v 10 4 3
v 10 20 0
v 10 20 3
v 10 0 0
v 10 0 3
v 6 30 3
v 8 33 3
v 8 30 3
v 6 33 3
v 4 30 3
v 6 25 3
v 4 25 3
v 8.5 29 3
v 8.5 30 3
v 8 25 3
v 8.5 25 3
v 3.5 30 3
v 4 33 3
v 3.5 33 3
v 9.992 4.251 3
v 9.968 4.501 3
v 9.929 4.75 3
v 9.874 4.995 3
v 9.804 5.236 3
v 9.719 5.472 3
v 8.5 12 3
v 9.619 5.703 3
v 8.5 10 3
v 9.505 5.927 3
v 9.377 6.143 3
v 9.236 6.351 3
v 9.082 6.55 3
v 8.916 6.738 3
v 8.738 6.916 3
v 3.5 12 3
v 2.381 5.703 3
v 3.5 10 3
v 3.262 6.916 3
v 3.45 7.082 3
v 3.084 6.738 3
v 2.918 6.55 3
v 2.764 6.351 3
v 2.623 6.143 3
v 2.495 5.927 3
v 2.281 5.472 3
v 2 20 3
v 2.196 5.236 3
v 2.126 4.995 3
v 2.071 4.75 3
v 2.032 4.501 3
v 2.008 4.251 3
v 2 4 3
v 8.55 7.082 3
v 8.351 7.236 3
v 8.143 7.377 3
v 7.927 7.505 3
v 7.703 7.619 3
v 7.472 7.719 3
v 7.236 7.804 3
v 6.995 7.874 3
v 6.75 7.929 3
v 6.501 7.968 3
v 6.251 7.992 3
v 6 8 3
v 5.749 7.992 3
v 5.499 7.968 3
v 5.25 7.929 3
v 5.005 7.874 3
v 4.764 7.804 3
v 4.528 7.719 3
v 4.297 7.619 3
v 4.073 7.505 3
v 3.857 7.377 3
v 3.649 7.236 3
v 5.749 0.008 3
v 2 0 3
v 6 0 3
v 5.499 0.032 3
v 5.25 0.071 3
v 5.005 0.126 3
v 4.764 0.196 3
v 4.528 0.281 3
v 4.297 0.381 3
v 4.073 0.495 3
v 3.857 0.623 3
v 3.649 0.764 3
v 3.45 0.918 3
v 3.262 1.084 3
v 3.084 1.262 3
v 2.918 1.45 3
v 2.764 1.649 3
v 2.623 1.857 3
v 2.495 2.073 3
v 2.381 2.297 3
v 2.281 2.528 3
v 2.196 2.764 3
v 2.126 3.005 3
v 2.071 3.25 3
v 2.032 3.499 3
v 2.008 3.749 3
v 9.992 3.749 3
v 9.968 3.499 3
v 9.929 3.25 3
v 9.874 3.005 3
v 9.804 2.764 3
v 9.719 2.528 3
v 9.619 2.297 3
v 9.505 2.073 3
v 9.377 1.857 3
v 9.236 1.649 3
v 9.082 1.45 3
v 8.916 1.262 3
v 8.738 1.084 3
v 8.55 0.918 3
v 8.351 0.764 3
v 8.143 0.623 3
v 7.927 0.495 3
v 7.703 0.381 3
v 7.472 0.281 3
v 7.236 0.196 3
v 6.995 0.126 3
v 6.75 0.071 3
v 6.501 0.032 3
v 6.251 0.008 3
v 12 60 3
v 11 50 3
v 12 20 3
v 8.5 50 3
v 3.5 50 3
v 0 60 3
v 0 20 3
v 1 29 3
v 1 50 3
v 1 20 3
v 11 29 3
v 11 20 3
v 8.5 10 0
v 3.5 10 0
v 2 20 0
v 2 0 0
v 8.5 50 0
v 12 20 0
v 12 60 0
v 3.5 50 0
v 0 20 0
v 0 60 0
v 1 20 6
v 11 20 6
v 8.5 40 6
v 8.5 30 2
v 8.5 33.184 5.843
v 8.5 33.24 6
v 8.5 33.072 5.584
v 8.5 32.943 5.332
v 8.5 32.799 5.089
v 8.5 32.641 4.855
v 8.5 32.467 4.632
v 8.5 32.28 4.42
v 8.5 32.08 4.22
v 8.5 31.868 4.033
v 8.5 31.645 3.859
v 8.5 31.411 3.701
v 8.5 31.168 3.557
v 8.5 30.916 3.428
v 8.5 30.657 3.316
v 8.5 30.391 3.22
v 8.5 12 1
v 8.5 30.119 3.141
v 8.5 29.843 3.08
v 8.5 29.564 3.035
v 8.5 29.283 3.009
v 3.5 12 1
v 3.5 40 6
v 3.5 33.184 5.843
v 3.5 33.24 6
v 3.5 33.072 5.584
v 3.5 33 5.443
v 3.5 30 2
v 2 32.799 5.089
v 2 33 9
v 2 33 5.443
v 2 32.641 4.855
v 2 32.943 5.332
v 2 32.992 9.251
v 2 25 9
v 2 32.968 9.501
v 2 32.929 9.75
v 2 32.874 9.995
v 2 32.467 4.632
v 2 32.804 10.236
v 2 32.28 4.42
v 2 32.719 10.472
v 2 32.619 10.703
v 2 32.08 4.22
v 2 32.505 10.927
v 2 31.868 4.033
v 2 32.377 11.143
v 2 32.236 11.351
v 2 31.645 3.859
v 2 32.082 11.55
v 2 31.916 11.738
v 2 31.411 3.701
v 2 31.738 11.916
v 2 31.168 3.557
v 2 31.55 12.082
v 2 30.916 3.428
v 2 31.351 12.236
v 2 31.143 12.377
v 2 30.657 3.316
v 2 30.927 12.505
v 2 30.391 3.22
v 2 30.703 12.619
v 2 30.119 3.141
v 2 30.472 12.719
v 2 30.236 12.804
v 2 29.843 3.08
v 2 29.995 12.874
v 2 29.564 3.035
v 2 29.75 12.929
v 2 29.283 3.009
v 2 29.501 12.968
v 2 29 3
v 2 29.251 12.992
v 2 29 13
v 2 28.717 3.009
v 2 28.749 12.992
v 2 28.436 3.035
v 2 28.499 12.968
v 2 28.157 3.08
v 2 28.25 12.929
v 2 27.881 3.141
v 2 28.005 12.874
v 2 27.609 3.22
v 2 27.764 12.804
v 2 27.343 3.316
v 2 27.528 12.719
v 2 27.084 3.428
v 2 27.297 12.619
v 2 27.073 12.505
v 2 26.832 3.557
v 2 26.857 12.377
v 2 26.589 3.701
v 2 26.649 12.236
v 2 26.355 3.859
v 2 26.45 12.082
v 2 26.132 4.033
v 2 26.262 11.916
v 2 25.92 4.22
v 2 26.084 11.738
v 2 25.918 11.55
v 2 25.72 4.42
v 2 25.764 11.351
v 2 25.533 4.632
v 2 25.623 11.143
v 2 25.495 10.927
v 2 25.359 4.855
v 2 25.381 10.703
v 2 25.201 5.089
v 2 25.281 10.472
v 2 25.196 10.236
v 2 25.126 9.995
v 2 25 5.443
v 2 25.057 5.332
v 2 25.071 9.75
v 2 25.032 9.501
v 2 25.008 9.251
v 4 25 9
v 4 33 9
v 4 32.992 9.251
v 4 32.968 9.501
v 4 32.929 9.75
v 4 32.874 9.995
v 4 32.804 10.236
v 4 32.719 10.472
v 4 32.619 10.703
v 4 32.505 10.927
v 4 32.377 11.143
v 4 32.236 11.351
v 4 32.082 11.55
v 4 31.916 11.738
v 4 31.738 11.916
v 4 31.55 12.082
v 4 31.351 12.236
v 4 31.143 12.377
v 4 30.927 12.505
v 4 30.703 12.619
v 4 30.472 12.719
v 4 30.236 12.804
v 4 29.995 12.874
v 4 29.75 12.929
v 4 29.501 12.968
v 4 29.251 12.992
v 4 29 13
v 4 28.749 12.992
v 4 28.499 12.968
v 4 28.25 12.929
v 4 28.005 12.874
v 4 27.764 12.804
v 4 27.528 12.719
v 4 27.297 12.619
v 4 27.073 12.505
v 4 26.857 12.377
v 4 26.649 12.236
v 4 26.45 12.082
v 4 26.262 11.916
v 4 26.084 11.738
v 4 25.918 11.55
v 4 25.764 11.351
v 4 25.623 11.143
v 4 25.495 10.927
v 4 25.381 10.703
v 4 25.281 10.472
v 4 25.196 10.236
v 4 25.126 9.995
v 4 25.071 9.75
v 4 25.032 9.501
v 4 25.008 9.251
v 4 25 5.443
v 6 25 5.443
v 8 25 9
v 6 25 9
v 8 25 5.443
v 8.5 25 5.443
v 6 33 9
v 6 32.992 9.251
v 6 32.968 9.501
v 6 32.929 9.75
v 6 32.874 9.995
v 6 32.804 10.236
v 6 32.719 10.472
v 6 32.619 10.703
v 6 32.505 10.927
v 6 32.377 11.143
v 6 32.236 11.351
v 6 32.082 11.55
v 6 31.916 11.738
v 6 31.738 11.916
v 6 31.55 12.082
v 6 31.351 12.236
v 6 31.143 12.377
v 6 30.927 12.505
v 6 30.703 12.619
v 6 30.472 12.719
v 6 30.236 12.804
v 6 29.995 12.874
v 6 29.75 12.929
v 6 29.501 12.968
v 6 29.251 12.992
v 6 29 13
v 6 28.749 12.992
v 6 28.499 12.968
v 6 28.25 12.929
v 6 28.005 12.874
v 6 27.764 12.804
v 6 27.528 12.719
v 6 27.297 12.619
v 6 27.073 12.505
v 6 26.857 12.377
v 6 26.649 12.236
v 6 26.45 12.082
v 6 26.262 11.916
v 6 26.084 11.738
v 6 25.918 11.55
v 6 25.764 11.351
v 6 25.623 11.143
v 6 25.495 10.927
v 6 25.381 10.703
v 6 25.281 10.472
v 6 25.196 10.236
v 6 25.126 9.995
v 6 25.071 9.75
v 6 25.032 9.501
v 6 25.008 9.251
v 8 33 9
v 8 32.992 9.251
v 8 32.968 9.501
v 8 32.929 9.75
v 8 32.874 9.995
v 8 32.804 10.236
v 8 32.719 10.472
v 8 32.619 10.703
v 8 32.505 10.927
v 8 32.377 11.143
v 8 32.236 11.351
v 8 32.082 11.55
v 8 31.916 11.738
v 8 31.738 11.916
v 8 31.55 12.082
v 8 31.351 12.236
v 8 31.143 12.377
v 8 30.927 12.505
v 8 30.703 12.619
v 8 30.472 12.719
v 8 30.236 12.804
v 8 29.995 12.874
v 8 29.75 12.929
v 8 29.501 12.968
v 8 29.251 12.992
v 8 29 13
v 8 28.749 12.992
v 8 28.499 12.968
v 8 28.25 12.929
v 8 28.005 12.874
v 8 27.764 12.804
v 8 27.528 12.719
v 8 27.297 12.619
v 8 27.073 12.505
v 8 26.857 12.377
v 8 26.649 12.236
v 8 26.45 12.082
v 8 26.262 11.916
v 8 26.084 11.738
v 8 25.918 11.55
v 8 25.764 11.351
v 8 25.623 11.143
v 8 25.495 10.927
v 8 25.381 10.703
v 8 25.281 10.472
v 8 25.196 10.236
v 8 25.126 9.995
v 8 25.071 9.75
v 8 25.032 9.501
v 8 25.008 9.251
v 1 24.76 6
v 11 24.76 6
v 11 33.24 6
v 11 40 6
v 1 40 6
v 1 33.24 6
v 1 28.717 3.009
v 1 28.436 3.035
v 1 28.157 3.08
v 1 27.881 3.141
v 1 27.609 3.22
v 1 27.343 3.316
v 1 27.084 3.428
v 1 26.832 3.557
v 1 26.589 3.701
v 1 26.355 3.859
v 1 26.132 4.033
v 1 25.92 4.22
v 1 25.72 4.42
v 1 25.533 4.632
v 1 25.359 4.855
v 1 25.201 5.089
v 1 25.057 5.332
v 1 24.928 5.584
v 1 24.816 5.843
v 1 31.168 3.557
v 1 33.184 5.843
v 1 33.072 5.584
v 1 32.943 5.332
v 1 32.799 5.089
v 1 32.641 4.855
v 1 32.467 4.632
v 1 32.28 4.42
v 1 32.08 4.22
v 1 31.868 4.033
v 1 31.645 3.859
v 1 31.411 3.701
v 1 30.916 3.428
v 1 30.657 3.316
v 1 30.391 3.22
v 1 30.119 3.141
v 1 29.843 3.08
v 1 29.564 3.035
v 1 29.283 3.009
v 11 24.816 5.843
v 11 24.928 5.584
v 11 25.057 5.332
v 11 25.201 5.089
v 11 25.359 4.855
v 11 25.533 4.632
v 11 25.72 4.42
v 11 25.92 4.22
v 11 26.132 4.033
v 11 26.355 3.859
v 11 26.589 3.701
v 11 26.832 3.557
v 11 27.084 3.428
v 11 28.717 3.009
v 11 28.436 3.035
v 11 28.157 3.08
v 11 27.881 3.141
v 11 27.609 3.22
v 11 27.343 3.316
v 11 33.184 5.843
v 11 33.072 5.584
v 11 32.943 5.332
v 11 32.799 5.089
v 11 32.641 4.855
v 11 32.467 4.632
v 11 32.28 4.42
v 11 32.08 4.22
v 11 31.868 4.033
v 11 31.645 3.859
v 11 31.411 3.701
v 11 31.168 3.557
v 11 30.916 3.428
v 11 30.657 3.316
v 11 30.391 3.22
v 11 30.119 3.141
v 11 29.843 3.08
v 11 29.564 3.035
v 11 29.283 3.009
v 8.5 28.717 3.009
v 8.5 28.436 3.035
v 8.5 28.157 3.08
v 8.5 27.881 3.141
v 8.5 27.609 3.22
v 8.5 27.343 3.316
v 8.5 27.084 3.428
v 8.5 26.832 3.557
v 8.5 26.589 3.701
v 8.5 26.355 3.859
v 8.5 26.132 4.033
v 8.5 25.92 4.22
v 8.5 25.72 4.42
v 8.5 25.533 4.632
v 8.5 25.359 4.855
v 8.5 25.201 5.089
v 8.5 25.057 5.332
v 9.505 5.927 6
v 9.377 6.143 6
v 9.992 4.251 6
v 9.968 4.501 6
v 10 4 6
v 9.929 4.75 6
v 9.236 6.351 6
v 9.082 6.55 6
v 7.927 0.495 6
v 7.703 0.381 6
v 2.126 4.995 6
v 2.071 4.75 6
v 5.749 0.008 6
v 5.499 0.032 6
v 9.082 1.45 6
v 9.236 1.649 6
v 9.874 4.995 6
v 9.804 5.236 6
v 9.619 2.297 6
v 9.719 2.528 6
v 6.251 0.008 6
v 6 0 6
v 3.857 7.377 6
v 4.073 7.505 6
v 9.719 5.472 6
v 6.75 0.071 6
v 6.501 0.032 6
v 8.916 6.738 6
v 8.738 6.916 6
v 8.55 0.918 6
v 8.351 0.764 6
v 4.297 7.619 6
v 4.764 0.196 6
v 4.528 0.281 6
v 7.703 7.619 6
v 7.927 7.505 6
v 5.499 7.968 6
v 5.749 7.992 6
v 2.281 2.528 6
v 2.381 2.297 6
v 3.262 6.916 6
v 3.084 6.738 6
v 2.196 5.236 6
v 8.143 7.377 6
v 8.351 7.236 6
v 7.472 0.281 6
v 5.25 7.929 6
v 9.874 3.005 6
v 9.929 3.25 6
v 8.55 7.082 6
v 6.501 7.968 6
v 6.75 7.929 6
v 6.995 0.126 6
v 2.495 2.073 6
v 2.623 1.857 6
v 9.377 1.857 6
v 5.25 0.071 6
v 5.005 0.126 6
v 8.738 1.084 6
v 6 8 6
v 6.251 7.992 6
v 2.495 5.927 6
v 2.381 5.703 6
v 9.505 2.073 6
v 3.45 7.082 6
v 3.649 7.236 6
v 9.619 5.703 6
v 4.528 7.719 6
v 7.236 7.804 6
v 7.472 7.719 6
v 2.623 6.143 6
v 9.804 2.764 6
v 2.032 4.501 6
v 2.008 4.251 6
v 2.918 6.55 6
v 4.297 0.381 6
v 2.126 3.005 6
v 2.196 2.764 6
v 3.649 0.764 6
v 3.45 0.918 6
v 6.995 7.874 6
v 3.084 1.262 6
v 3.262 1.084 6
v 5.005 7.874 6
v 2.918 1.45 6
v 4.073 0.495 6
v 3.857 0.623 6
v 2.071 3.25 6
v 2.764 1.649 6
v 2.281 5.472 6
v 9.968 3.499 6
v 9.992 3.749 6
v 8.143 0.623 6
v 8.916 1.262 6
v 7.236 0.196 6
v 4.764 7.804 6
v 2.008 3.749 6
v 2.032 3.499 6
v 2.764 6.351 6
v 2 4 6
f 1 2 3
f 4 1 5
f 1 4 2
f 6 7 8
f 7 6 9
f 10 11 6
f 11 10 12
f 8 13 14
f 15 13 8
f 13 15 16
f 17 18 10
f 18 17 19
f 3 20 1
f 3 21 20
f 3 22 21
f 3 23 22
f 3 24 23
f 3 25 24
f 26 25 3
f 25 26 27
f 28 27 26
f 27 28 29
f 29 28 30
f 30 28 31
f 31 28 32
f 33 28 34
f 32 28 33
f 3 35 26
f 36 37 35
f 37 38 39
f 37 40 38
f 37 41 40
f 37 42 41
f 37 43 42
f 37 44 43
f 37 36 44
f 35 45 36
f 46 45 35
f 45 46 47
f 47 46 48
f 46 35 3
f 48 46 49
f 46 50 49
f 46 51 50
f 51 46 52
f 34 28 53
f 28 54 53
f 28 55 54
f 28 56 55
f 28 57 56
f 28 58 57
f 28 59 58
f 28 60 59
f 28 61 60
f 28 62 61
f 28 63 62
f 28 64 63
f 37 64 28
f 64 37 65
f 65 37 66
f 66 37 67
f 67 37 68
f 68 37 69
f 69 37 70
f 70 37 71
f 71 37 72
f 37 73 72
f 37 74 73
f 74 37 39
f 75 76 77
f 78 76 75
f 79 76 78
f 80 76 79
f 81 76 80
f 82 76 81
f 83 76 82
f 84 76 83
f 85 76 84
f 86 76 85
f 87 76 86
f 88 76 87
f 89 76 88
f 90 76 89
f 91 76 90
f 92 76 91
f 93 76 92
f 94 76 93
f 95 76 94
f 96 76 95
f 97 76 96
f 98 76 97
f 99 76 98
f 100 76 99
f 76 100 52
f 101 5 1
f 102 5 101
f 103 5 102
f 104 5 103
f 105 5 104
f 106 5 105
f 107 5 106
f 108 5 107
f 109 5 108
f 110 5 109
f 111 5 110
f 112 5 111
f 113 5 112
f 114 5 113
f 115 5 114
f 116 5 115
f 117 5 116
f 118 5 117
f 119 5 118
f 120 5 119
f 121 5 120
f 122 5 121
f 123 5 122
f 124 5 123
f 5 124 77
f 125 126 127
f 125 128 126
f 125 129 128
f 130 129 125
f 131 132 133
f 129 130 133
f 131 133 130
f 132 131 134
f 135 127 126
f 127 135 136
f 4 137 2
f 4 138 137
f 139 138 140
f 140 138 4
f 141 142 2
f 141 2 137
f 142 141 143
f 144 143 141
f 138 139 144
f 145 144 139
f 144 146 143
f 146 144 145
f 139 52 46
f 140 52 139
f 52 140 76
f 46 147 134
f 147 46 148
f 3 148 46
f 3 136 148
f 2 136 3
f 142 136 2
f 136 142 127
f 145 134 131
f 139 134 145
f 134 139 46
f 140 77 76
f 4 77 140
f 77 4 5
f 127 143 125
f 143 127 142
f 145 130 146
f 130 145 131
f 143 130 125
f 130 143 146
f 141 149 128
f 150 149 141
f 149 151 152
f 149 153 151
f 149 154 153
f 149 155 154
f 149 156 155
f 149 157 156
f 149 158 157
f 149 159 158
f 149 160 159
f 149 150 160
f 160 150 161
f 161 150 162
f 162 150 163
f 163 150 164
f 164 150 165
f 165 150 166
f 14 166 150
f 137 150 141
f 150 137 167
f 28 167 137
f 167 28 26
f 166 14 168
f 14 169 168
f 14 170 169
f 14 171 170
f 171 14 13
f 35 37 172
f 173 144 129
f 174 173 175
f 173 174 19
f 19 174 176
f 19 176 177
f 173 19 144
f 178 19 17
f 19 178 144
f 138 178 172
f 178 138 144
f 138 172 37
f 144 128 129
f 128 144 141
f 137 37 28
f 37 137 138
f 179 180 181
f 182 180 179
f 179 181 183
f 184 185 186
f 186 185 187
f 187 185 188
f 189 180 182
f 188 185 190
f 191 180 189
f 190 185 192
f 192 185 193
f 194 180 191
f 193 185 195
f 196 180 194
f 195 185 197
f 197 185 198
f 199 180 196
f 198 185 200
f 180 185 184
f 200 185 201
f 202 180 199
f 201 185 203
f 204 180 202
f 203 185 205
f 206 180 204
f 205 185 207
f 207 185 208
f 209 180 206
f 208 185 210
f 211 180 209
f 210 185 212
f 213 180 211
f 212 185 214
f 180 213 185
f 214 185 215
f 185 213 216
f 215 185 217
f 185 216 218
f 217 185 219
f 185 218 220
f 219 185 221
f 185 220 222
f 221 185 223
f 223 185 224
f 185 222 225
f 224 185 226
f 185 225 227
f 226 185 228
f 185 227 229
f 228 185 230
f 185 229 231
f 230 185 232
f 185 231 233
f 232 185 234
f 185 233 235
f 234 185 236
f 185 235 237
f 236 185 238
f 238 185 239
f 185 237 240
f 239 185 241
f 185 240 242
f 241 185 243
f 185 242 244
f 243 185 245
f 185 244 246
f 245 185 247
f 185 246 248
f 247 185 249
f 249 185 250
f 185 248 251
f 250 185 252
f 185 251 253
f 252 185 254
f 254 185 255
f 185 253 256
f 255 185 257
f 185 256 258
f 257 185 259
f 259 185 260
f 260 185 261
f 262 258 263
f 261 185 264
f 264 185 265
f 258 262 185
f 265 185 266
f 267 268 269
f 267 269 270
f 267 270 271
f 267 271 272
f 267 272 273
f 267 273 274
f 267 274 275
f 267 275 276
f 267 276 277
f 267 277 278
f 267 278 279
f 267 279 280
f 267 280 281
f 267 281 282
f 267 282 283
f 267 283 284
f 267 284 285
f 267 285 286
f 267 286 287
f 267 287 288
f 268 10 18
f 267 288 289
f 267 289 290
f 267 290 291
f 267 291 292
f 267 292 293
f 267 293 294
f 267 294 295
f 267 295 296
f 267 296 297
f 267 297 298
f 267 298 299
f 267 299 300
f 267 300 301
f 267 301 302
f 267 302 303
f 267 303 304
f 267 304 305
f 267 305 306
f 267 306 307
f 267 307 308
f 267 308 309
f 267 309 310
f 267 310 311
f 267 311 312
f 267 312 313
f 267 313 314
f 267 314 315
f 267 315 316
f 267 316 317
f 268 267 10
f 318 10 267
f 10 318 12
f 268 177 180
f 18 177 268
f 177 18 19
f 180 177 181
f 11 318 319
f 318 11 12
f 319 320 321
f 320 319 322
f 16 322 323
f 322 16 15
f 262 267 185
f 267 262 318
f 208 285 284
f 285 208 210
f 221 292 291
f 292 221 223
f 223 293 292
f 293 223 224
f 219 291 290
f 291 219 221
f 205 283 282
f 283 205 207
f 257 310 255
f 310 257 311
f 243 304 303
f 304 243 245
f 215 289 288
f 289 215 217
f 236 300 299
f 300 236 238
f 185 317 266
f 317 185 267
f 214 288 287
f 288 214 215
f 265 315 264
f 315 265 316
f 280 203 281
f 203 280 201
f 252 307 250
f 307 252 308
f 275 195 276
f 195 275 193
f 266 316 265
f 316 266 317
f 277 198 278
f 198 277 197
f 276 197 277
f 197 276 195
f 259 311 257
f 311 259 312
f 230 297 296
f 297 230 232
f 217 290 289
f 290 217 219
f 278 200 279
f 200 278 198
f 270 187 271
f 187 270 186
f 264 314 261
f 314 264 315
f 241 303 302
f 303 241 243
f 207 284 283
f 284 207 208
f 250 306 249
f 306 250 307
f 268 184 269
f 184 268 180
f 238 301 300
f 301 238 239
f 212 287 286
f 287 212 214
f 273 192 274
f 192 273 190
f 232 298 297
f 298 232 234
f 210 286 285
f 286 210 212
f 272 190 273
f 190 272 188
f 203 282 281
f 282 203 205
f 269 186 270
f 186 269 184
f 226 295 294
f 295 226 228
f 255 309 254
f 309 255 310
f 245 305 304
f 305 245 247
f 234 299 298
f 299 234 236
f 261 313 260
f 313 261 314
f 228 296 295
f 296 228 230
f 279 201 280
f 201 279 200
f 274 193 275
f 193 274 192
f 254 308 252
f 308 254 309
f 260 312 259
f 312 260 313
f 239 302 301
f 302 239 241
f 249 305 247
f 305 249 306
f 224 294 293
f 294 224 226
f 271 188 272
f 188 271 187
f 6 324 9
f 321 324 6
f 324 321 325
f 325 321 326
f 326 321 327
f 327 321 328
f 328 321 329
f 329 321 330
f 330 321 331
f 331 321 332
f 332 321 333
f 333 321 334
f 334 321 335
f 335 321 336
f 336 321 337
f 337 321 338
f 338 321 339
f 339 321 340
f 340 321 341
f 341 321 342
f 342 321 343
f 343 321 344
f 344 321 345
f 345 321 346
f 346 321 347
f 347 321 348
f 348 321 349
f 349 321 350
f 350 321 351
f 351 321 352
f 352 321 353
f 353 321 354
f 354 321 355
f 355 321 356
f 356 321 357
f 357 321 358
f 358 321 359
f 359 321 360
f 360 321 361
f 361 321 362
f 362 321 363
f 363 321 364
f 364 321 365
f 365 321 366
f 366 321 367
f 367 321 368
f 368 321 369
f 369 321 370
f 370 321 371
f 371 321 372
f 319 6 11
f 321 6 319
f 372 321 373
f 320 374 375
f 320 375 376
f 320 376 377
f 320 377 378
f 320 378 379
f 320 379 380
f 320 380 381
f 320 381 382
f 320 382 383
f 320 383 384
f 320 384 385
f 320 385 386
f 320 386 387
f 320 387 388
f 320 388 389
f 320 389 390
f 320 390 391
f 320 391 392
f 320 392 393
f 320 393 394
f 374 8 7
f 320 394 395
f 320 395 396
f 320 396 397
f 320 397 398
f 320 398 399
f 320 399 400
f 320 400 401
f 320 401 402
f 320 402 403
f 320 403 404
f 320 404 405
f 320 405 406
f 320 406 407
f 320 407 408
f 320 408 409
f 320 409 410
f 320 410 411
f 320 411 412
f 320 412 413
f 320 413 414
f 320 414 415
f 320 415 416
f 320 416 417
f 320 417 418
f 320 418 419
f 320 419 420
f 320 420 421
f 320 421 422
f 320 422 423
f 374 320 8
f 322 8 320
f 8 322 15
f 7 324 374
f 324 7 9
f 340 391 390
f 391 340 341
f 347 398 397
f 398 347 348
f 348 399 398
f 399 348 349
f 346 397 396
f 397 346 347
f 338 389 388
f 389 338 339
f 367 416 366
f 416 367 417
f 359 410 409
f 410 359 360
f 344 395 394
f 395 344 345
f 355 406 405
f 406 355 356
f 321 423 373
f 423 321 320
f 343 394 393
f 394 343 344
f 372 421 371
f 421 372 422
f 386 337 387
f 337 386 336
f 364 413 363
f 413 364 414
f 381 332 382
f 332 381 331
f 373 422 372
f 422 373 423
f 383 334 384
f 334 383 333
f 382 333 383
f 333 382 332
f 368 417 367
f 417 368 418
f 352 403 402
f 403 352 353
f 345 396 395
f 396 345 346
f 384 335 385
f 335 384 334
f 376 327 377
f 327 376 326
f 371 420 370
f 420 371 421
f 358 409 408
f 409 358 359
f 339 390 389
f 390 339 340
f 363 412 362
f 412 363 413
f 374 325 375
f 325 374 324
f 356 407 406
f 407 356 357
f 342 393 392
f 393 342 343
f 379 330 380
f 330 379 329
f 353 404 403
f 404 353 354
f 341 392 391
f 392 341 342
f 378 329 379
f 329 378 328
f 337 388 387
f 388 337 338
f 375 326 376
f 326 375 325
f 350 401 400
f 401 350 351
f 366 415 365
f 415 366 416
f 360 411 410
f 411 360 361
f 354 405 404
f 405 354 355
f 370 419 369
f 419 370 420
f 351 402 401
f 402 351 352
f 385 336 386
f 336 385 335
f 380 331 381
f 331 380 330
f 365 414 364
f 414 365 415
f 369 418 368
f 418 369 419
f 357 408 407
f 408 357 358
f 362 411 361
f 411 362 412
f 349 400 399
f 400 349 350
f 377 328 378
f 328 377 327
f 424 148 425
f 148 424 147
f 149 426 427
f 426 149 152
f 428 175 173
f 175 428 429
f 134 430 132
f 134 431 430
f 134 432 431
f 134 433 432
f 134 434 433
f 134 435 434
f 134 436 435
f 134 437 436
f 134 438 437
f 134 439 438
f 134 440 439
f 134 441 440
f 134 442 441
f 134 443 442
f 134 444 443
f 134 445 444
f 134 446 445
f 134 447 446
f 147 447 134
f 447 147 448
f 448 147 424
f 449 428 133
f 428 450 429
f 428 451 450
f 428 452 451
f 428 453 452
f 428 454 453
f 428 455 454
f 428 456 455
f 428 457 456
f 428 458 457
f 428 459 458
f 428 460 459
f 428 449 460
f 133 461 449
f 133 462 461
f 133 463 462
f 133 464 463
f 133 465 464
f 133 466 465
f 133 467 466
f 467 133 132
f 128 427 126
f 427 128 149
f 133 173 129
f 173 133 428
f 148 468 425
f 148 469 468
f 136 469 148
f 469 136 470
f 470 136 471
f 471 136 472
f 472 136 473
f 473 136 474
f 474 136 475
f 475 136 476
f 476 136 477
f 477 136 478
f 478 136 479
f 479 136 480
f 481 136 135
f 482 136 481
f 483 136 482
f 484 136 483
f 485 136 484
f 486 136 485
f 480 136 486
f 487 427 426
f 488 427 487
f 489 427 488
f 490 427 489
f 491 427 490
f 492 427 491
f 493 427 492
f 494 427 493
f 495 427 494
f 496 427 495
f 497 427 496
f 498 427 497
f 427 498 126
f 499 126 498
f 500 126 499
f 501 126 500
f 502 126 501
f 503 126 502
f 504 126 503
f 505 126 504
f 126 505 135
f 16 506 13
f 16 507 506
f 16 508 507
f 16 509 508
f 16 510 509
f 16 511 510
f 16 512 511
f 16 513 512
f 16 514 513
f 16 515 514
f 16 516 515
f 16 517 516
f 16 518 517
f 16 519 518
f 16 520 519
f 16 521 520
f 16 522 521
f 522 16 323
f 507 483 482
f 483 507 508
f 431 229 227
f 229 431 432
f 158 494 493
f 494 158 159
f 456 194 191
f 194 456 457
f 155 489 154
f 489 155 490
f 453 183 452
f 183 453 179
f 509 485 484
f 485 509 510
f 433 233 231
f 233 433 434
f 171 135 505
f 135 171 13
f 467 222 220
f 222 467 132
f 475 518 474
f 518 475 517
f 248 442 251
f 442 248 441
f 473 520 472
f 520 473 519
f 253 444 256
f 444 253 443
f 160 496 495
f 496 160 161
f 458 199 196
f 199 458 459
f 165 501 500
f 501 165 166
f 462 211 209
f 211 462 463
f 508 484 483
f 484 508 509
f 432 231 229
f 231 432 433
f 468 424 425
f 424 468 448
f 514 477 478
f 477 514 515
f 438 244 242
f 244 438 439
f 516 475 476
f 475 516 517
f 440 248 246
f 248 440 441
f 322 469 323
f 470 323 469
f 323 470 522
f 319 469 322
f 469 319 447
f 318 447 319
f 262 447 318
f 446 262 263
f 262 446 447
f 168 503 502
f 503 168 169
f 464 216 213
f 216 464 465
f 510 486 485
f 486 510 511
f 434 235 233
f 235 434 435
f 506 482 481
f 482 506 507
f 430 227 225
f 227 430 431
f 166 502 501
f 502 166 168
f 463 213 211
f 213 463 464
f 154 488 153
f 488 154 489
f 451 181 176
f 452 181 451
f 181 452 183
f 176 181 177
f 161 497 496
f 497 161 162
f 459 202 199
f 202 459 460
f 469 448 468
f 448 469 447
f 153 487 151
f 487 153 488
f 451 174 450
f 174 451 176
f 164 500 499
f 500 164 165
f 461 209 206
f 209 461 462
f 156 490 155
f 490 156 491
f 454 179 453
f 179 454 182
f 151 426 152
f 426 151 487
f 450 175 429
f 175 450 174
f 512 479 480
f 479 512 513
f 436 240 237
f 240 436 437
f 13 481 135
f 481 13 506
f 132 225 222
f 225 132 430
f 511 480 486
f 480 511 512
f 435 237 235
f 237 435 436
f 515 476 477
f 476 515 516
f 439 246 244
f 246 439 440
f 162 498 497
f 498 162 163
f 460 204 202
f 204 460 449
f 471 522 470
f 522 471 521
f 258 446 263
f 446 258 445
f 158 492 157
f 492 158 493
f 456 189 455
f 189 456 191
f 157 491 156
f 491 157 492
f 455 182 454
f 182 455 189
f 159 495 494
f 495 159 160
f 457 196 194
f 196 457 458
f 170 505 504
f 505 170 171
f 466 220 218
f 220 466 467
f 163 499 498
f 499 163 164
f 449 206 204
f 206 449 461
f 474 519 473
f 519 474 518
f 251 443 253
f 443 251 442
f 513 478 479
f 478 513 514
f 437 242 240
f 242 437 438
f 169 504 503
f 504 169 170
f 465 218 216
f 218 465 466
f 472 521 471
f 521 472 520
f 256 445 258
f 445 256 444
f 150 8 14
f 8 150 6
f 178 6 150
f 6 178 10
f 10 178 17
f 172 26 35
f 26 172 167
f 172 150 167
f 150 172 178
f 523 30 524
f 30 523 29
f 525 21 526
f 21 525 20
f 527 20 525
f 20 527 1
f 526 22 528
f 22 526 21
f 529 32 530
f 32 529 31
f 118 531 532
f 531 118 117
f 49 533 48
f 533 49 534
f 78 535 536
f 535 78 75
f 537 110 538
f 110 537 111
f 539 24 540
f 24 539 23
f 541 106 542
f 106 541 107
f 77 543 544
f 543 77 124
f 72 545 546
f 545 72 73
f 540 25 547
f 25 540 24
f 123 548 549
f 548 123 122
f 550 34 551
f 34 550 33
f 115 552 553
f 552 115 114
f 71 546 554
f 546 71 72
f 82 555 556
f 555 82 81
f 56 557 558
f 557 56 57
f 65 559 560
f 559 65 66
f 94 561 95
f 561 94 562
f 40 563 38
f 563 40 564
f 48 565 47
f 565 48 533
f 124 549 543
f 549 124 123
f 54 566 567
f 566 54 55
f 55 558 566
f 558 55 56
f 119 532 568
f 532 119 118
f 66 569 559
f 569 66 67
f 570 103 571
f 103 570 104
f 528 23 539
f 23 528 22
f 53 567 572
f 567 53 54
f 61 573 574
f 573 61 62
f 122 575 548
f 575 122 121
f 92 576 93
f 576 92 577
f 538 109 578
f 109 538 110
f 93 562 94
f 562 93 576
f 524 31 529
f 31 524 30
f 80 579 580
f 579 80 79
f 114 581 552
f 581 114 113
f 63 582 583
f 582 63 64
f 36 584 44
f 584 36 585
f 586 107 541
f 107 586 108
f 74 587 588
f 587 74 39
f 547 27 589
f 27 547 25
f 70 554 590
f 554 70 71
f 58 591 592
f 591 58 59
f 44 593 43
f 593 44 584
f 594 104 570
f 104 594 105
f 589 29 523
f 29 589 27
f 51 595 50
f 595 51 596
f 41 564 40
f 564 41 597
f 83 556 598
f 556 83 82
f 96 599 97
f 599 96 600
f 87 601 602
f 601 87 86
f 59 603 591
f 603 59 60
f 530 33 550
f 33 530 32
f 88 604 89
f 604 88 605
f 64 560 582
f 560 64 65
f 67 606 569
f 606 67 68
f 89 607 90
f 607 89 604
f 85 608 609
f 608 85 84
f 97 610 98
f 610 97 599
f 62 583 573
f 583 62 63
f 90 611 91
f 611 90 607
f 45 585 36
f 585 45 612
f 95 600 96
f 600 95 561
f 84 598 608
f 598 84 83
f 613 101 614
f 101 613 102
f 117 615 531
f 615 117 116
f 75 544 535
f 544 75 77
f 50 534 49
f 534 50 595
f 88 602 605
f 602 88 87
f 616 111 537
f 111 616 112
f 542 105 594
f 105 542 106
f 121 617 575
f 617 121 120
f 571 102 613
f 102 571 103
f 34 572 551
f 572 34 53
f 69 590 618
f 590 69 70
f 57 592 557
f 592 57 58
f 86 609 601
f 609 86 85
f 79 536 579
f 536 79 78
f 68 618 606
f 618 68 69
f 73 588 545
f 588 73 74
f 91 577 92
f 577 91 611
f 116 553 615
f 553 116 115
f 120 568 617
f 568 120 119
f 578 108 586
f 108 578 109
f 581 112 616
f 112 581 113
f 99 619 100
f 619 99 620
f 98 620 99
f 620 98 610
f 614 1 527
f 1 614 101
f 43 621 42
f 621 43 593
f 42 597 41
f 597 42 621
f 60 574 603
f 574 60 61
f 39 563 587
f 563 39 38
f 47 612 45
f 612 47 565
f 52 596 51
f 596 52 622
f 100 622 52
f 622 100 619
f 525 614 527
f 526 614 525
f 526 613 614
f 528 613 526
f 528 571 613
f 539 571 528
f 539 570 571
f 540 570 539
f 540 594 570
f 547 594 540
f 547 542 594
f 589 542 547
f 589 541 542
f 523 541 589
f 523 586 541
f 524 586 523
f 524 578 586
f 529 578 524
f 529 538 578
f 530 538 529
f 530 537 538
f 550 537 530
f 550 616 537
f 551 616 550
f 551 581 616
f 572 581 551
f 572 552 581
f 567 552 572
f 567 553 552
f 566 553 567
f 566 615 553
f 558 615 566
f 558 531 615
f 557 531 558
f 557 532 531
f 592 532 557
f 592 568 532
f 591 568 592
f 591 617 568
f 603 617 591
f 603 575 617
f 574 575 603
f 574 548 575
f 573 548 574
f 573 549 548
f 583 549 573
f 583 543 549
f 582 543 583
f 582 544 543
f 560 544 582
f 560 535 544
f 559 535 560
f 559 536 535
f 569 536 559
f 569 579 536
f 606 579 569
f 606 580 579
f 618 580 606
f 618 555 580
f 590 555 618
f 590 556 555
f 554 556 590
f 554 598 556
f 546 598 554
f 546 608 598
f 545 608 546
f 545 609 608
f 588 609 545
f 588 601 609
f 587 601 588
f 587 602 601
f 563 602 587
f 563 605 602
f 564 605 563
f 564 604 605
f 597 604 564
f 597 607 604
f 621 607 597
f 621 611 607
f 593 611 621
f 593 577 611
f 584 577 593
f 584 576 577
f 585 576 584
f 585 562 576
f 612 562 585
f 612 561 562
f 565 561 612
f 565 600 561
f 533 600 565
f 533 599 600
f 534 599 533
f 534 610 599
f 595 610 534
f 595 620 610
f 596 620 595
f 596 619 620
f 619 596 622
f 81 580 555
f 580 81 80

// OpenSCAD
electrode = 4; // radius
handlewidth = 12;
handlethickness = 3;
handlelength = 40;
rodlength = 20; // the narrow bit on which the electrode support rests
rodwidth = 8;
slotwidth = 5;
slotlength = handlelength + rodlength - 20;
standoffwidth=8;
standoffheight=6; // the height of the rectangular bit without the circular head
standoffthickness=2;
standoffdistance=25; // distance from 0,0
wedgelength = 18;
wedgedistance=12; // distance from 0,0
supportwidth=handlewidth-2;

// handle
translate([0, 0, 0])
    handle();  
translate([(handlewidth-slotwidth)/2, wedgedistance, handlethickness])
    wedge();
translate([standoffthickness*2, standoffdistance, handlethickness])
    standoff();
translate([standoffthickness*4, standoffdistance, handlethickness])
    standoff();
translate([supportwidth+((handlewidth-supportwidth)/2), 0, handlethickness])
    support();
translate([handlewidth/2, electrode, handlethickness])
    electrodesupport();

// the flat rectangular part that you squeeze between your fingers
module handle() {
     translate([0, 0, 0]) {
        difference() {
            union() {
                translate([(handlewidth-rodwidth)/2, 0, 0])
                    color("red") cube([rodwidth, rodlength, handlethickness]);
                translate([0, rodlength, 0])
                    cube([handlewidth, handlelength, handlethickness]);
            }
            // slot inside the handle
            translate([(handlewidth/2)-(slotwidth/2) , handlelength + rodlength - slotlength - 10, 0]) {
                cube([slotwidth, slotlength, handlethickness]);
            }
        }
    }
}

// the triagular bit into which the standoffs fit
module support() {
    radius = 4;
    rotate([0, -90, 0]) {
        difference() {
            difference()  {
                linear_extrude(supportwidth) {
                    polygon([[0, 20], [0, 50], [3, 40], [3, 20]]);
                }
                translate([0, 0, (supportwidth - slotwidth) / 2])
                    color("red") linear_extrude(slotwidth) {
                        polygon([[0, 50], [3, 40], [3, 25], [0, 25]]);
                    }
            }
            translate([4.5, 29, 0]) {
                cylinder(handlewidth, radius+.5, radius+.5, $fn=100);
            }
        }
    }
}


// the bit where the electrode fits on
module electrodesupport() {
    cylinder(3, electrode, electrode, $fn=100);
}

// the bits in the middle that fit the two parts togehter
module standoff() {
    rotate([0, -90, 0]) {
        color("blue") cube([standoffheight, standoffwidth, standoffthickness]);
        translate([standoffheight, standoffwidth/2, 0]) {
            cylinder(standoffthickness, standoffwidth/2, standoffwidth/2, $fn=100);
        }
    }
}

// the wedge in the slot which keeps the spring in place
module wedge() {
    rotate([0, 90, 0])
    color("green") linear_extrude(slotwidth) {
        polygon([[0,0], [0, wedgelength], [1, wedgelength], [2, 0]]);
    }
}
